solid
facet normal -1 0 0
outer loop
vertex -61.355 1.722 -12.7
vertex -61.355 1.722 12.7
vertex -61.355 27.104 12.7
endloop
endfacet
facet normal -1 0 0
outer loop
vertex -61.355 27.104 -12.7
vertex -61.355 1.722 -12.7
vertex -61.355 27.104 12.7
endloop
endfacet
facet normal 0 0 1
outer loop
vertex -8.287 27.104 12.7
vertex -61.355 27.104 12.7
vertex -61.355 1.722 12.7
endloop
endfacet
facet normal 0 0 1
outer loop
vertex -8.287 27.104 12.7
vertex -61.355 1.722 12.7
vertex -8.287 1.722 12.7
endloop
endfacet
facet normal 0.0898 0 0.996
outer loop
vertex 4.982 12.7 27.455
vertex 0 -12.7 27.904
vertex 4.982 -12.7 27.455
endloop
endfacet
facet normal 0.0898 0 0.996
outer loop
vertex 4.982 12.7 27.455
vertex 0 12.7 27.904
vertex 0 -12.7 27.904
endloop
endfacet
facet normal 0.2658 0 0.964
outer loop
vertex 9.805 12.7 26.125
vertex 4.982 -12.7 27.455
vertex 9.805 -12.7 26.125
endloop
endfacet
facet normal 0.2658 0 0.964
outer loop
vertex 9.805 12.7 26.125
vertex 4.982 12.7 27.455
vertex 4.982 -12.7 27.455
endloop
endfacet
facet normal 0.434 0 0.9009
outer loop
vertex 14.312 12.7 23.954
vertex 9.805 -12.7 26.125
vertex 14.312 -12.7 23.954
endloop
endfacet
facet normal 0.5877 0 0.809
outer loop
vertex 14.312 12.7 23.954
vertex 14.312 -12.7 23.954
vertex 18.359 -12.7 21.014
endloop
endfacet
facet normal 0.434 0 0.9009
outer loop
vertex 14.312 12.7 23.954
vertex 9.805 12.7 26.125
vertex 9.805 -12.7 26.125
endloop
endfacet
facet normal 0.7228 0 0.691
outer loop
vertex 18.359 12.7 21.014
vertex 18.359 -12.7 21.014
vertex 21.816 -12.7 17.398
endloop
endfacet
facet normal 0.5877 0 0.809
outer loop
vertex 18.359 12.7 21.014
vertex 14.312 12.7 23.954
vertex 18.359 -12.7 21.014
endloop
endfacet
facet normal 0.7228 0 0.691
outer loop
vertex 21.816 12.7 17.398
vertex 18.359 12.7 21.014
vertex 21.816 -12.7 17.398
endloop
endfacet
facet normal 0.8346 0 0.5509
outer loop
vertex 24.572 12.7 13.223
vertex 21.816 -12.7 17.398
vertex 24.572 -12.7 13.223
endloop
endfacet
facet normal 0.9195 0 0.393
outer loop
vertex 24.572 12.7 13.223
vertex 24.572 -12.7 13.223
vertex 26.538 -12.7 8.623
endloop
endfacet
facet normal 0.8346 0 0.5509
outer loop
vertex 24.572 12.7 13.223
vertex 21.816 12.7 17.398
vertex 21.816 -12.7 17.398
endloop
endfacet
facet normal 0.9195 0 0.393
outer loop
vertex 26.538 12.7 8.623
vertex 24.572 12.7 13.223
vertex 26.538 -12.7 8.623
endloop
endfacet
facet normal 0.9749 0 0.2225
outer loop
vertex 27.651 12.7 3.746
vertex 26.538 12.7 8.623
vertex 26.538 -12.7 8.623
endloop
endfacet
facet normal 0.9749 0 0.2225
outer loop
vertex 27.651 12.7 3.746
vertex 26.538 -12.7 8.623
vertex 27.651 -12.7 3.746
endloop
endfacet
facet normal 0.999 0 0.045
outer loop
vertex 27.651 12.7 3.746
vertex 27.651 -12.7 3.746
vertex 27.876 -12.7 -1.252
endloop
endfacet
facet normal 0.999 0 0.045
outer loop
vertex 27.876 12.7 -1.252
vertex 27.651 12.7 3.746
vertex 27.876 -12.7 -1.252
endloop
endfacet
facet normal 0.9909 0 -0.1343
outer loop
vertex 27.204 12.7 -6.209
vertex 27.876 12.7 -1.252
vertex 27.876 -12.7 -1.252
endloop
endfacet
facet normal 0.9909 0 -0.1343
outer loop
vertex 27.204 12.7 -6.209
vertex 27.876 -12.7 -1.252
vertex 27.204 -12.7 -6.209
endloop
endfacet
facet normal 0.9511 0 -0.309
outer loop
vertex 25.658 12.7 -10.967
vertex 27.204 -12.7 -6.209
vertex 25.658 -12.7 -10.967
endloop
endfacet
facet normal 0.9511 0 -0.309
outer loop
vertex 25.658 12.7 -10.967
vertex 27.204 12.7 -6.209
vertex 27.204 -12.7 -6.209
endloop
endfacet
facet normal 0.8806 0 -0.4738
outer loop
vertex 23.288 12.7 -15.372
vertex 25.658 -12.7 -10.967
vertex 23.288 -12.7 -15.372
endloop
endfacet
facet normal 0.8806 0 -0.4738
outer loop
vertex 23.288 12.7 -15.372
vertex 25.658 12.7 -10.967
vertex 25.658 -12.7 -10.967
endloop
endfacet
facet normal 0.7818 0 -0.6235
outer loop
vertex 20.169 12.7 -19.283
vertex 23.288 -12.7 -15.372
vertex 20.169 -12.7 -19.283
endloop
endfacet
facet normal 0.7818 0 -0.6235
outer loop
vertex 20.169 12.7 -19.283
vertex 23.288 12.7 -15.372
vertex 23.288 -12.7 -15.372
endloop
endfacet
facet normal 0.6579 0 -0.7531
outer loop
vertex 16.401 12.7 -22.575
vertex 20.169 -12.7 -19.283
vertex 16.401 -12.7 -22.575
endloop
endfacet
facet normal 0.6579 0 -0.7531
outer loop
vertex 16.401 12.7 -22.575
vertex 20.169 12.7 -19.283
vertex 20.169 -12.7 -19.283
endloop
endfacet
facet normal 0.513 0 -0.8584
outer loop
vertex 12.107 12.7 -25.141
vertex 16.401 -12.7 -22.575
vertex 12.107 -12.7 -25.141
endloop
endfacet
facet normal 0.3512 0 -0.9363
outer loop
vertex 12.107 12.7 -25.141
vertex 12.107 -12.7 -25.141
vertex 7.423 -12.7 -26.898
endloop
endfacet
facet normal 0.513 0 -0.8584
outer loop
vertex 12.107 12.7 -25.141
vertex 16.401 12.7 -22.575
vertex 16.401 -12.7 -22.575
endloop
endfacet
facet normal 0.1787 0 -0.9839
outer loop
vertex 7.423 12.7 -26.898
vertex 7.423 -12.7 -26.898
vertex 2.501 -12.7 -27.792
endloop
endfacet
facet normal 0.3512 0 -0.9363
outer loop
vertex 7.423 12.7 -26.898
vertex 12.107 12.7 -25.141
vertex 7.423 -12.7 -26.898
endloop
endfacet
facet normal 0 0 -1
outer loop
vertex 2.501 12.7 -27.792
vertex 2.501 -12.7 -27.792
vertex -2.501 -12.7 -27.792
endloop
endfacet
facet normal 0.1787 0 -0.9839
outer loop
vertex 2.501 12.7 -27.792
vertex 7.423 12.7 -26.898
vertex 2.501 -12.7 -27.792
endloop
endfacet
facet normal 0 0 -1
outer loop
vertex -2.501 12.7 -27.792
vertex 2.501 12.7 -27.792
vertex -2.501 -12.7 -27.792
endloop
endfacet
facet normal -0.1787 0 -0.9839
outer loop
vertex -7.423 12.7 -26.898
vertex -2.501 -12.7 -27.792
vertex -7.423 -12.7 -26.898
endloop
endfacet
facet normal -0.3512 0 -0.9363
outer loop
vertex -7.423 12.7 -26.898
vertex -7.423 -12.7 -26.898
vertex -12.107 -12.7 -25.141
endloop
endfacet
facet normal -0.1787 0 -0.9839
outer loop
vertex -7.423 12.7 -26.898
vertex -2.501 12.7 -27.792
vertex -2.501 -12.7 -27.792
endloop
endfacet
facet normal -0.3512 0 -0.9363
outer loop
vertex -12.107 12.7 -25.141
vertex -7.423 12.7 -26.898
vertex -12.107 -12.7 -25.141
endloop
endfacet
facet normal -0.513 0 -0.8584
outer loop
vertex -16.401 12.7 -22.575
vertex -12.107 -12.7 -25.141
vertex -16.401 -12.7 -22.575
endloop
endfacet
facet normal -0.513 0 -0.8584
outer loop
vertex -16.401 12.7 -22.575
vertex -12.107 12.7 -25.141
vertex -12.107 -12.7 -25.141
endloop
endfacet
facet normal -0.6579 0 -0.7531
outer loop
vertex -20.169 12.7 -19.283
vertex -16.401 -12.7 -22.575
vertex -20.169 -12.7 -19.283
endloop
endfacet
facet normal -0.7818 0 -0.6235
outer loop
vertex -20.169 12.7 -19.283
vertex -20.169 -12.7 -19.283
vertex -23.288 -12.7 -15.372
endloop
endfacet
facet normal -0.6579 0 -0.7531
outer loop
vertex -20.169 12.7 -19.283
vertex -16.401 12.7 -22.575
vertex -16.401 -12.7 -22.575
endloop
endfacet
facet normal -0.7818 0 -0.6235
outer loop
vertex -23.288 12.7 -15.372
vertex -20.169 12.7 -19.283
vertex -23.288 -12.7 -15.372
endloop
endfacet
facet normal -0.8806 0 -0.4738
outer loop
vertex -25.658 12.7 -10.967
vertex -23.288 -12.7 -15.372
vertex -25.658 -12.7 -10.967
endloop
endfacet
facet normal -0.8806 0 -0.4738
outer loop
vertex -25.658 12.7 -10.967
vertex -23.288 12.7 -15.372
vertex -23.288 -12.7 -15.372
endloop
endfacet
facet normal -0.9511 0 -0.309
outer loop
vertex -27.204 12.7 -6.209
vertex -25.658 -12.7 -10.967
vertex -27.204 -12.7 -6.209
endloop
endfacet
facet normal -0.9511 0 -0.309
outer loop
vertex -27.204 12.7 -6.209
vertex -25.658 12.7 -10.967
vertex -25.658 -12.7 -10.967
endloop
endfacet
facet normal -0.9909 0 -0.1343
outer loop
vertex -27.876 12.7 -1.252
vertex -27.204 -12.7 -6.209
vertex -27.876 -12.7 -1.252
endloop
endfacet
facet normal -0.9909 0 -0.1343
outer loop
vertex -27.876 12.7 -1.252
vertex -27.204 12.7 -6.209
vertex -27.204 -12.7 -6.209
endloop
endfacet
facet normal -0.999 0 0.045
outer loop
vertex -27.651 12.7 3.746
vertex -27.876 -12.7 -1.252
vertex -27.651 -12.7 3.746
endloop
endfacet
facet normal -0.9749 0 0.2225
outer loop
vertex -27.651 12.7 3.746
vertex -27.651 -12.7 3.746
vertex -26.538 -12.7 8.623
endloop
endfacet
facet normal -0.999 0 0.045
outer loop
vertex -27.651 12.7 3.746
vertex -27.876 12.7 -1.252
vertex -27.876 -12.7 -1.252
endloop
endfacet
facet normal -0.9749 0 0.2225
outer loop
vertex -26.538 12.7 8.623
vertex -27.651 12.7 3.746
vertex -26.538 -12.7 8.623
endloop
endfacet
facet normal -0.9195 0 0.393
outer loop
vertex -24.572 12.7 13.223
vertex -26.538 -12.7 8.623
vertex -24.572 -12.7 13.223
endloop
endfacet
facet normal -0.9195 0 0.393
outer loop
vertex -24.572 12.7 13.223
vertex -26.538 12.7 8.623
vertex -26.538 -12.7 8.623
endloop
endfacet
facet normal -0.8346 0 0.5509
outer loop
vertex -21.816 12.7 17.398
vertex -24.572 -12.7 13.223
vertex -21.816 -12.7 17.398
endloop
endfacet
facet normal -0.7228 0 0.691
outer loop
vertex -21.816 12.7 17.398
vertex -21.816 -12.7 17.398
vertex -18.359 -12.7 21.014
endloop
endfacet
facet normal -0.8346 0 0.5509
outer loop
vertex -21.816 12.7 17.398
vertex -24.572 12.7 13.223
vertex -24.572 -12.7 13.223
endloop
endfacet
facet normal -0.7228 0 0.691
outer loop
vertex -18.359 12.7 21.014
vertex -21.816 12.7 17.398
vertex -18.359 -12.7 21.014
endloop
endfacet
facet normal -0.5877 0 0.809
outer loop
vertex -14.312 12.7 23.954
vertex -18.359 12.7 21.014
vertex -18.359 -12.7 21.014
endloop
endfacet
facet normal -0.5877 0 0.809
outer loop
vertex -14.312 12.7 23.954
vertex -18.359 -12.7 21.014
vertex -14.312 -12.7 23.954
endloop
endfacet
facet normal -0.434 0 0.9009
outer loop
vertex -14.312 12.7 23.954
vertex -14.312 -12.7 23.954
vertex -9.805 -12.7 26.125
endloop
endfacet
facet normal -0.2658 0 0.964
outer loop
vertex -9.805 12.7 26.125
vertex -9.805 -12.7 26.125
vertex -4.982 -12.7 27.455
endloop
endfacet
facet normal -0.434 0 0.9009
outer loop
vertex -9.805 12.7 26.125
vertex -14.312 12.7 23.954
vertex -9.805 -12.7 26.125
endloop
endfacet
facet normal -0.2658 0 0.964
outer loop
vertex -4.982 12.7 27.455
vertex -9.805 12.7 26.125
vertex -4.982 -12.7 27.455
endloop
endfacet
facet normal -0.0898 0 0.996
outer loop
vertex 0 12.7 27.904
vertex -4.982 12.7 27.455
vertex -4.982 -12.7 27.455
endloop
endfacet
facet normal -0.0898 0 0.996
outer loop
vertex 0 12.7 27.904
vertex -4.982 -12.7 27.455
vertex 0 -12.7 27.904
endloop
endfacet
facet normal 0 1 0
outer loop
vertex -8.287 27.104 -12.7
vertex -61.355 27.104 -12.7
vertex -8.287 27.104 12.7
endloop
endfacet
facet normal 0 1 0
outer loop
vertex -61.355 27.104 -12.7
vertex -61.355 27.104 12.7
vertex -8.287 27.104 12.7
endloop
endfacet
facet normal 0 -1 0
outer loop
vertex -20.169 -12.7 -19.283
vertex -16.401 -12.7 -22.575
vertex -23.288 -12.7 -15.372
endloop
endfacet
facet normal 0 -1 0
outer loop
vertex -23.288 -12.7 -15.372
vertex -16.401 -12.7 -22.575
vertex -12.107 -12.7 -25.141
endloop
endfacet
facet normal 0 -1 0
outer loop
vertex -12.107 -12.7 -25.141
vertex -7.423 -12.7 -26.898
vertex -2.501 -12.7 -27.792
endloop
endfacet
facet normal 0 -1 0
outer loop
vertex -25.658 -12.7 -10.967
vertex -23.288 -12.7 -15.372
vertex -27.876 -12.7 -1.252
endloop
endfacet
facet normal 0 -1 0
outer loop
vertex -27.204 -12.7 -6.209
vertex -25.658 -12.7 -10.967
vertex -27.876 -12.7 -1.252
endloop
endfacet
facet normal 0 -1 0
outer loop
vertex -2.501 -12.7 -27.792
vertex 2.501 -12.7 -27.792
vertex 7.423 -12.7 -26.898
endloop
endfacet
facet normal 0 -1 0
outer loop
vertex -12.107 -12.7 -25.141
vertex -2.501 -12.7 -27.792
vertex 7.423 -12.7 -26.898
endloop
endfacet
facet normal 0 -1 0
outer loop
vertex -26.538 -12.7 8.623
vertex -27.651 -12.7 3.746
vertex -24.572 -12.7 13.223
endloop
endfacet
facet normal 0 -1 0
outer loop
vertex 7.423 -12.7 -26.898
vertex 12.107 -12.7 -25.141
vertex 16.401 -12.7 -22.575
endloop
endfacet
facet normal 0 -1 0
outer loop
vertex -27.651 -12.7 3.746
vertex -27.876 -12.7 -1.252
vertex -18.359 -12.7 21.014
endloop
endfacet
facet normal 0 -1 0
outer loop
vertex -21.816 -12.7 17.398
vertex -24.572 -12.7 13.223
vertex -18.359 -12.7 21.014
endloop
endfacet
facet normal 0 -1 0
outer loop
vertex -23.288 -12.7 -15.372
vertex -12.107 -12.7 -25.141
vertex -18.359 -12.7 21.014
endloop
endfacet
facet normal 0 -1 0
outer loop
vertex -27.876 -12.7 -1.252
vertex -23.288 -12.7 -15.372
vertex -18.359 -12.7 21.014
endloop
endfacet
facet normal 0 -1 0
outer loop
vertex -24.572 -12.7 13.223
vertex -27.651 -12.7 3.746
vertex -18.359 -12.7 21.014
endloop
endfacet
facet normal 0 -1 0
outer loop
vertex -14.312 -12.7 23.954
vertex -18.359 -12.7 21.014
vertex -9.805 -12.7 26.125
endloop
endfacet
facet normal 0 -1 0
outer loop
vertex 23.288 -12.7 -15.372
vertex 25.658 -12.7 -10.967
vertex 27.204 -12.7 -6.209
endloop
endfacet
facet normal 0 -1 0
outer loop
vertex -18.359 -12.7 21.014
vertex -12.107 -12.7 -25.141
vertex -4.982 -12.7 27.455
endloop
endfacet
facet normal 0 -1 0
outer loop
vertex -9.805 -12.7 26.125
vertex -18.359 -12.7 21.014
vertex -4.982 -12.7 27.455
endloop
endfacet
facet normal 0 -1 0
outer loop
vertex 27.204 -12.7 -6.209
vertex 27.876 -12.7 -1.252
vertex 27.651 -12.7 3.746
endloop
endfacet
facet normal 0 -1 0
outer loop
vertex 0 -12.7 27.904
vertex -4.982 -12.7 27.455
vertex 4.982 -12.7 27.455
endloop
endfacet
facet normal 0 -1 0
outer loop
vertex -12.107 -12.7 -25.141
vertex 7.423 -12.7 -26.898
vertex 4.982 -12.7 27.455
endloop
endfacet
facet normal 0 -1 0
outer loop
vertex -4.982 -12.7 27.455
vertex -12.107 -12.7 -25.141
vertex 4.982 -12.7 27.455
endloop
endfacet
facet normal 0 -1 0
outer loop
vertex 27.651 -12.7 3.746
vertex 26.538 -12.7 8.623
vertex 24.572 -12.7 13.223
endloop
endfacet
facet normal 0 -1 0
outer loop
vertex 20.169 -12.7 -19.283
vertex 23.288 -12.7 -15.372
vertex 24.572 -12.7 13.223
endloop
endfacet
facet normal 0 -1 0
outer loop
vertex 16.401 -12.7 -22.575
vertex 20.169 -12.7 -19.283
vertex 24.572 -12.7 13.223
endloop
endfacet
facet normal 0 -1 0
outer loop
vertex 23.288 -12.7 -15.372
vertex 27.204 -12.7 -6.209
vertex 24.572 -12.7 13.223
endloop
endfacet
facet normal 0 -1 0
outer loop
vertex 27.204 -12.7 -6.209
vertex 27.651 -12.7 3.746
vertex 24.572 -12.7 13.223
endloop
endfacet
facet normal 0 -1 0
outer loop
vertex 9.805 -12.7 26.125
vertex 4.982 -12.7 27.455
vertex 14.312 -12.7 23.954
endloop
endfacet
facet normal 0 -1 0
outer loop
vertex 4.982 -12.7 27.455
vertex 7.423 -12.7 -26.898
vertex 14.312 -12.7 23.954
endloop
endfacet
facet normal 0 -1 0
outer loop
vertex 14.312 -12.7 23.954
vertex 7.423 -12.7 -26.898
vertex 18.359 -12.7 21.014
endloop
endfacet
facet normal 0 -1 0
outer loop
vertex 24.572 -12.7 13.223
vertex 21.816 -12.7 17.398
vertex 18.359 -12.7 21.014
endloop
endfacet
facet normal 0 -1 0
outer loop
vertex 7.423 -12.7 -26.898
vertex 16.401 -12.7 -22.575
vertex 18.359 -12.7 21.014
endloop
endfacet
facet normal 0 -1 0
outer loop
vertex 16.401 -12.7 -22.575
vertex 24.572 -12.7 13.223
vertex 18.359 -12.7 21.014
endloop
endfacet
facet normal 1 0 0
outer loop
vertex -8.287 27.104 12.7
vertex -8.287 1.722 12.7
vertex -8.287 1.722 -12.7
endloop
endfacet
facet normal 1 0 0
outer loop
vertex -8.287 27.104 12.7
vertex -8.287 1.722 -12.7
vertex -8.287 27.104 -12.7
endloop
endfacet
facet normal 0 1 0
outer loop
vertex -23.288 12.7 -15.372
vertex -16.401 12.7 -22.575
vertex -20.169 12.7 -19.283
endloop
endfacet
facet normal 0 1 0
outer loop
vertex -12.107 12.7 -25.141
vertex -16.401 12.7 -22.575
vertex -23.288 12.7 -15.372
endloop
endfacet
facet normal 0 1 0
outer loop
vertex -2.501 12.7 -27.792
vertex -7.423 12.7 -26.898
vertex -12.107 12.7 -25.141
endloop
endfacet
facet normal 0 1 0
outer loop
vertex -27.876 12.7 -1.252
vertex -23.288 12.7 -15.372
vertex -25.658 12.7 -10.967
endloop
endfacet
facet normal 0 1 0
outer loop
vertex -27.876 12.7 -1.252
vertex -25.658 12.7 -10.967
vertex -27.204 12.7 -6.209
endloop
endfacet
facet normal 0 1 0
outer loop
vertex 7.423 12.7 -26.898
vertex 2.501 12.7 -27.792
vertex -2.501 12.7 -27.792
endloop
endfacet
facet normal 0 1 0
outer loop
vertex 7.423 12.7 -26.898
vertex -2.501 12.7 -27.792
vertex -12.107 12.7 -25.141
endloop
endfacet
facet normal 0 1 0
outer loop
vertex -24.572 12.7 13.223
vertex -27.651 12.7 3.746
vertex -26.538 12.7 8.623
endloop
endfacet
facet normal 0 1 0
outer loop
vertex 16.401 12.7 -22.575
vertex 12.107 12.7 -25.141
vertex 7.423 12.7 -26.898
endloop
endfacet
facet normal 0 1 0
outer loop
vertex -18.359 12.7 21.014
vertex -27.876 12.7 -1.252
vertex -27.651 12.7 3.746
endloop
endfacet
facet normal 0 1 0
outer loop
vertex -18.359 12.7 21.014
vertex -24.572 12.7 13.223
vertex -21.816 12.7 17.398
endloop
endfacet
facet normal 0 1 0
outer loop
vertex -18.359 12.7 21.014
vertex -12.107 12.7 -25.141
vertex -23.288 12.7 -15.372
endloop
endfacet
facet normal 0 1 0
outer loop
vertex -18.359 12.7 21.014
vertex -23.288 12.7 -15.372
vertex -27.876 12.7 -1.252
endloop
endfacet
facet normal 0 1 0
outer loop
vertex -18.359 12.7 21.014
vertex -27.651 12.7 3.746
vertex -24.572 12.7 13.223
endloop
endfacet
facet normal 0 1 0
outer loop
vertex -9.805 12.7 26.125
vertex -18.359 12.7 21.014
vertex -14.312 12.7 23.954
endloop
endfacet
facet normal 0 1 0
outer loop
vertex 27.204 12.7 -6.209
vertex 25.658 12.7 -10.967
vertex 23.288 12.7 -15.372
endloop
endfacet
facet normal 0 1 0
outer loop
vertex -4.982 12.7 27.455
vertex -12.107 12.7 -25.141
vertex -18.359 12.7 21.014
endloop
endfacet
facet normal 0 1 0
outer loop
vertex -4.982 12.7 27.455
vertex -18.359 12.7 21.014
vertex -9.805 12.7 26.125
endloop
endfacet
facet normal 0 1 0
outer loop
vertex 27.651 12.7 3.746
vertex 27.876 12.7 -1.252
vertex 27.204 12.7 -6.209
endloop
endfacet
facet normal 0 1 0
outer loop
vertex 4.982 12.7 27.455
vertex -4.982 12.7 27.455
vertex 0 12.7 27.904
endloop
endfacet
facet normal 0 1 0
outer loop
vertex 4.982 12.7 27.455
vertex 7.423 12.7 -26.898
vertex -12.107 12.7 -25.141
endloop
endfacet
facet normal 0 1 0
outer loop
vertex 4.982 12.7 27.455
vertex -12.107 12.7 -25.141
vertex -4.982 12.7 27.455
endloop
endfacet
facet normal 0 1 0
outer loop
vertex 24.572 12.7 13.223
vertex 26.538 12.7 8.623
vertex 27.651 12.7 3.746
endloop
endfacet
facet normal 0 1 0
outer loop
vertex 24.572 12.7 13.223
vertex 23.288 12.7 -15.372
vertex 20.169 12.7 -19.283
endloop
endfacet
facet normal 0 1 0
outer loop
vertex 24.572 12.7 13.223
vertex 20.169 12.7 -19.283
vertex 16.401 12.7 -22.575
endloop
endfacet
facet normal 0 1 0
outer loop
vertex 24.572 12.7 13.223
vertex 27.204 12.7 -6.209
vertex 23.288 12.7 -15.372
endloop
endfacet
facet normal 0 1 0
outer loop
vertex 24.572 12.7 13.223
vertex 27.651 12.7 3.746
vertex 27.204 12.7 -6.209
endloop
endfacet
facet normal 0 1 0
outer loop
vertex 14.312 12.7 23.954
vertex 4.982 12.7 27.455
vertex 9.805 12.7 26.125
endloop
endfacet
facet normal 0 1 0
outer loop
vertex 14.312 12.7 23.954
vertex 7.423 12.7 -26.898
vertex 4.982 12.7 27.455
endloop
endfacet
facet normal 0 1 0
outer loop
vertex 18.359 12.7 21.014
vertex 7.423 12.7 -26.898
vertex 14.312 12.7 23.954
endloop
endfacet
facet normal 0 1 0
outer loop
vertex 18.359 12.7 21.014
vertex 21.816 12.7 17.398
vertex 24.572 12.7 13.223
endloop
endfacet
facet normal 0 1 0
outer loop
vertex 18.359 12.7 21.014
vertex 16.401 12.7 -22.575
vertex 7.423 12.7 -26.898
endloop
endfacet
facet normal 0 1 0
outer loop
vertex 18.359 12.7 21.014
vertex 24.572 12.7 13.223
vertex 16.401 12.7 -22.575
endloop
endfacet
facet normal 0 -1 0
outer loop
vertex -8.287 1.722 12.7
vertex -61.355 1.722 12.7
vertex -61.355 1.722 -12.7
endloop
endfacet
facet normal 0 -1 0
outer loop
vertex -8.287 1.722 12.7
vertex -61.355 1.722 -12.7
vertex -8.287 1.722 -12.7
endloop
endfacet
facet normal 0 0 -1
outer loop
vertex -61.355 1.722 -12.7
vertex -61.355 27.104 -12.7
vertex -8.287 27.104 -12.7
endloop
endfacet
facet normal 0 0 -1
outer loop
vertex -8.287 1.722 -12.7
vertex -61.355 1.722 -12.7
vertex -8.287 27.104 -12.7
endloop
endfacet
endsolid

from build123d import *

# Parameters (mm, degrees)
SKETCH1_R           = 27.90389213
BOSS_EXTRUDE1_DEPTH = 12.7
SKETCH2_W           = 53.067899245
SKETCH2_H           = 25.382302614
BOSS_EXTRUDE2_DEPTH = 12.7


with BuildPart() as part:
    # Sketch1 → Boss-Extrude1 (new, symmetric)
    with BuildSketch(Plane(origin=(0, 0, 0), x_dir=(1, 0, 0), z_dir=(0, 1, 0))):
        with Locations(Location((0, 0, 0), (0, 0, 270))):
            Circle(SKETCH1_R)
    extrude(amount=BOSS_EXTRUDE1_DEPTH, both=True)


with BuildPart() as body_2:
    # Sketch2 → Boss-Extrude2 (new, symmetric)
    with BuildSketch(Plane.XY):
        with Locations((-34.820638145, 14.412890899)):
            Rectangle(SKETCH2_W, SKETCH2_H)
    extrude(amount=BOSS_EXTRUDE2_DEPTH, both=True)


solid = Compound([part.part, body_2.part])
